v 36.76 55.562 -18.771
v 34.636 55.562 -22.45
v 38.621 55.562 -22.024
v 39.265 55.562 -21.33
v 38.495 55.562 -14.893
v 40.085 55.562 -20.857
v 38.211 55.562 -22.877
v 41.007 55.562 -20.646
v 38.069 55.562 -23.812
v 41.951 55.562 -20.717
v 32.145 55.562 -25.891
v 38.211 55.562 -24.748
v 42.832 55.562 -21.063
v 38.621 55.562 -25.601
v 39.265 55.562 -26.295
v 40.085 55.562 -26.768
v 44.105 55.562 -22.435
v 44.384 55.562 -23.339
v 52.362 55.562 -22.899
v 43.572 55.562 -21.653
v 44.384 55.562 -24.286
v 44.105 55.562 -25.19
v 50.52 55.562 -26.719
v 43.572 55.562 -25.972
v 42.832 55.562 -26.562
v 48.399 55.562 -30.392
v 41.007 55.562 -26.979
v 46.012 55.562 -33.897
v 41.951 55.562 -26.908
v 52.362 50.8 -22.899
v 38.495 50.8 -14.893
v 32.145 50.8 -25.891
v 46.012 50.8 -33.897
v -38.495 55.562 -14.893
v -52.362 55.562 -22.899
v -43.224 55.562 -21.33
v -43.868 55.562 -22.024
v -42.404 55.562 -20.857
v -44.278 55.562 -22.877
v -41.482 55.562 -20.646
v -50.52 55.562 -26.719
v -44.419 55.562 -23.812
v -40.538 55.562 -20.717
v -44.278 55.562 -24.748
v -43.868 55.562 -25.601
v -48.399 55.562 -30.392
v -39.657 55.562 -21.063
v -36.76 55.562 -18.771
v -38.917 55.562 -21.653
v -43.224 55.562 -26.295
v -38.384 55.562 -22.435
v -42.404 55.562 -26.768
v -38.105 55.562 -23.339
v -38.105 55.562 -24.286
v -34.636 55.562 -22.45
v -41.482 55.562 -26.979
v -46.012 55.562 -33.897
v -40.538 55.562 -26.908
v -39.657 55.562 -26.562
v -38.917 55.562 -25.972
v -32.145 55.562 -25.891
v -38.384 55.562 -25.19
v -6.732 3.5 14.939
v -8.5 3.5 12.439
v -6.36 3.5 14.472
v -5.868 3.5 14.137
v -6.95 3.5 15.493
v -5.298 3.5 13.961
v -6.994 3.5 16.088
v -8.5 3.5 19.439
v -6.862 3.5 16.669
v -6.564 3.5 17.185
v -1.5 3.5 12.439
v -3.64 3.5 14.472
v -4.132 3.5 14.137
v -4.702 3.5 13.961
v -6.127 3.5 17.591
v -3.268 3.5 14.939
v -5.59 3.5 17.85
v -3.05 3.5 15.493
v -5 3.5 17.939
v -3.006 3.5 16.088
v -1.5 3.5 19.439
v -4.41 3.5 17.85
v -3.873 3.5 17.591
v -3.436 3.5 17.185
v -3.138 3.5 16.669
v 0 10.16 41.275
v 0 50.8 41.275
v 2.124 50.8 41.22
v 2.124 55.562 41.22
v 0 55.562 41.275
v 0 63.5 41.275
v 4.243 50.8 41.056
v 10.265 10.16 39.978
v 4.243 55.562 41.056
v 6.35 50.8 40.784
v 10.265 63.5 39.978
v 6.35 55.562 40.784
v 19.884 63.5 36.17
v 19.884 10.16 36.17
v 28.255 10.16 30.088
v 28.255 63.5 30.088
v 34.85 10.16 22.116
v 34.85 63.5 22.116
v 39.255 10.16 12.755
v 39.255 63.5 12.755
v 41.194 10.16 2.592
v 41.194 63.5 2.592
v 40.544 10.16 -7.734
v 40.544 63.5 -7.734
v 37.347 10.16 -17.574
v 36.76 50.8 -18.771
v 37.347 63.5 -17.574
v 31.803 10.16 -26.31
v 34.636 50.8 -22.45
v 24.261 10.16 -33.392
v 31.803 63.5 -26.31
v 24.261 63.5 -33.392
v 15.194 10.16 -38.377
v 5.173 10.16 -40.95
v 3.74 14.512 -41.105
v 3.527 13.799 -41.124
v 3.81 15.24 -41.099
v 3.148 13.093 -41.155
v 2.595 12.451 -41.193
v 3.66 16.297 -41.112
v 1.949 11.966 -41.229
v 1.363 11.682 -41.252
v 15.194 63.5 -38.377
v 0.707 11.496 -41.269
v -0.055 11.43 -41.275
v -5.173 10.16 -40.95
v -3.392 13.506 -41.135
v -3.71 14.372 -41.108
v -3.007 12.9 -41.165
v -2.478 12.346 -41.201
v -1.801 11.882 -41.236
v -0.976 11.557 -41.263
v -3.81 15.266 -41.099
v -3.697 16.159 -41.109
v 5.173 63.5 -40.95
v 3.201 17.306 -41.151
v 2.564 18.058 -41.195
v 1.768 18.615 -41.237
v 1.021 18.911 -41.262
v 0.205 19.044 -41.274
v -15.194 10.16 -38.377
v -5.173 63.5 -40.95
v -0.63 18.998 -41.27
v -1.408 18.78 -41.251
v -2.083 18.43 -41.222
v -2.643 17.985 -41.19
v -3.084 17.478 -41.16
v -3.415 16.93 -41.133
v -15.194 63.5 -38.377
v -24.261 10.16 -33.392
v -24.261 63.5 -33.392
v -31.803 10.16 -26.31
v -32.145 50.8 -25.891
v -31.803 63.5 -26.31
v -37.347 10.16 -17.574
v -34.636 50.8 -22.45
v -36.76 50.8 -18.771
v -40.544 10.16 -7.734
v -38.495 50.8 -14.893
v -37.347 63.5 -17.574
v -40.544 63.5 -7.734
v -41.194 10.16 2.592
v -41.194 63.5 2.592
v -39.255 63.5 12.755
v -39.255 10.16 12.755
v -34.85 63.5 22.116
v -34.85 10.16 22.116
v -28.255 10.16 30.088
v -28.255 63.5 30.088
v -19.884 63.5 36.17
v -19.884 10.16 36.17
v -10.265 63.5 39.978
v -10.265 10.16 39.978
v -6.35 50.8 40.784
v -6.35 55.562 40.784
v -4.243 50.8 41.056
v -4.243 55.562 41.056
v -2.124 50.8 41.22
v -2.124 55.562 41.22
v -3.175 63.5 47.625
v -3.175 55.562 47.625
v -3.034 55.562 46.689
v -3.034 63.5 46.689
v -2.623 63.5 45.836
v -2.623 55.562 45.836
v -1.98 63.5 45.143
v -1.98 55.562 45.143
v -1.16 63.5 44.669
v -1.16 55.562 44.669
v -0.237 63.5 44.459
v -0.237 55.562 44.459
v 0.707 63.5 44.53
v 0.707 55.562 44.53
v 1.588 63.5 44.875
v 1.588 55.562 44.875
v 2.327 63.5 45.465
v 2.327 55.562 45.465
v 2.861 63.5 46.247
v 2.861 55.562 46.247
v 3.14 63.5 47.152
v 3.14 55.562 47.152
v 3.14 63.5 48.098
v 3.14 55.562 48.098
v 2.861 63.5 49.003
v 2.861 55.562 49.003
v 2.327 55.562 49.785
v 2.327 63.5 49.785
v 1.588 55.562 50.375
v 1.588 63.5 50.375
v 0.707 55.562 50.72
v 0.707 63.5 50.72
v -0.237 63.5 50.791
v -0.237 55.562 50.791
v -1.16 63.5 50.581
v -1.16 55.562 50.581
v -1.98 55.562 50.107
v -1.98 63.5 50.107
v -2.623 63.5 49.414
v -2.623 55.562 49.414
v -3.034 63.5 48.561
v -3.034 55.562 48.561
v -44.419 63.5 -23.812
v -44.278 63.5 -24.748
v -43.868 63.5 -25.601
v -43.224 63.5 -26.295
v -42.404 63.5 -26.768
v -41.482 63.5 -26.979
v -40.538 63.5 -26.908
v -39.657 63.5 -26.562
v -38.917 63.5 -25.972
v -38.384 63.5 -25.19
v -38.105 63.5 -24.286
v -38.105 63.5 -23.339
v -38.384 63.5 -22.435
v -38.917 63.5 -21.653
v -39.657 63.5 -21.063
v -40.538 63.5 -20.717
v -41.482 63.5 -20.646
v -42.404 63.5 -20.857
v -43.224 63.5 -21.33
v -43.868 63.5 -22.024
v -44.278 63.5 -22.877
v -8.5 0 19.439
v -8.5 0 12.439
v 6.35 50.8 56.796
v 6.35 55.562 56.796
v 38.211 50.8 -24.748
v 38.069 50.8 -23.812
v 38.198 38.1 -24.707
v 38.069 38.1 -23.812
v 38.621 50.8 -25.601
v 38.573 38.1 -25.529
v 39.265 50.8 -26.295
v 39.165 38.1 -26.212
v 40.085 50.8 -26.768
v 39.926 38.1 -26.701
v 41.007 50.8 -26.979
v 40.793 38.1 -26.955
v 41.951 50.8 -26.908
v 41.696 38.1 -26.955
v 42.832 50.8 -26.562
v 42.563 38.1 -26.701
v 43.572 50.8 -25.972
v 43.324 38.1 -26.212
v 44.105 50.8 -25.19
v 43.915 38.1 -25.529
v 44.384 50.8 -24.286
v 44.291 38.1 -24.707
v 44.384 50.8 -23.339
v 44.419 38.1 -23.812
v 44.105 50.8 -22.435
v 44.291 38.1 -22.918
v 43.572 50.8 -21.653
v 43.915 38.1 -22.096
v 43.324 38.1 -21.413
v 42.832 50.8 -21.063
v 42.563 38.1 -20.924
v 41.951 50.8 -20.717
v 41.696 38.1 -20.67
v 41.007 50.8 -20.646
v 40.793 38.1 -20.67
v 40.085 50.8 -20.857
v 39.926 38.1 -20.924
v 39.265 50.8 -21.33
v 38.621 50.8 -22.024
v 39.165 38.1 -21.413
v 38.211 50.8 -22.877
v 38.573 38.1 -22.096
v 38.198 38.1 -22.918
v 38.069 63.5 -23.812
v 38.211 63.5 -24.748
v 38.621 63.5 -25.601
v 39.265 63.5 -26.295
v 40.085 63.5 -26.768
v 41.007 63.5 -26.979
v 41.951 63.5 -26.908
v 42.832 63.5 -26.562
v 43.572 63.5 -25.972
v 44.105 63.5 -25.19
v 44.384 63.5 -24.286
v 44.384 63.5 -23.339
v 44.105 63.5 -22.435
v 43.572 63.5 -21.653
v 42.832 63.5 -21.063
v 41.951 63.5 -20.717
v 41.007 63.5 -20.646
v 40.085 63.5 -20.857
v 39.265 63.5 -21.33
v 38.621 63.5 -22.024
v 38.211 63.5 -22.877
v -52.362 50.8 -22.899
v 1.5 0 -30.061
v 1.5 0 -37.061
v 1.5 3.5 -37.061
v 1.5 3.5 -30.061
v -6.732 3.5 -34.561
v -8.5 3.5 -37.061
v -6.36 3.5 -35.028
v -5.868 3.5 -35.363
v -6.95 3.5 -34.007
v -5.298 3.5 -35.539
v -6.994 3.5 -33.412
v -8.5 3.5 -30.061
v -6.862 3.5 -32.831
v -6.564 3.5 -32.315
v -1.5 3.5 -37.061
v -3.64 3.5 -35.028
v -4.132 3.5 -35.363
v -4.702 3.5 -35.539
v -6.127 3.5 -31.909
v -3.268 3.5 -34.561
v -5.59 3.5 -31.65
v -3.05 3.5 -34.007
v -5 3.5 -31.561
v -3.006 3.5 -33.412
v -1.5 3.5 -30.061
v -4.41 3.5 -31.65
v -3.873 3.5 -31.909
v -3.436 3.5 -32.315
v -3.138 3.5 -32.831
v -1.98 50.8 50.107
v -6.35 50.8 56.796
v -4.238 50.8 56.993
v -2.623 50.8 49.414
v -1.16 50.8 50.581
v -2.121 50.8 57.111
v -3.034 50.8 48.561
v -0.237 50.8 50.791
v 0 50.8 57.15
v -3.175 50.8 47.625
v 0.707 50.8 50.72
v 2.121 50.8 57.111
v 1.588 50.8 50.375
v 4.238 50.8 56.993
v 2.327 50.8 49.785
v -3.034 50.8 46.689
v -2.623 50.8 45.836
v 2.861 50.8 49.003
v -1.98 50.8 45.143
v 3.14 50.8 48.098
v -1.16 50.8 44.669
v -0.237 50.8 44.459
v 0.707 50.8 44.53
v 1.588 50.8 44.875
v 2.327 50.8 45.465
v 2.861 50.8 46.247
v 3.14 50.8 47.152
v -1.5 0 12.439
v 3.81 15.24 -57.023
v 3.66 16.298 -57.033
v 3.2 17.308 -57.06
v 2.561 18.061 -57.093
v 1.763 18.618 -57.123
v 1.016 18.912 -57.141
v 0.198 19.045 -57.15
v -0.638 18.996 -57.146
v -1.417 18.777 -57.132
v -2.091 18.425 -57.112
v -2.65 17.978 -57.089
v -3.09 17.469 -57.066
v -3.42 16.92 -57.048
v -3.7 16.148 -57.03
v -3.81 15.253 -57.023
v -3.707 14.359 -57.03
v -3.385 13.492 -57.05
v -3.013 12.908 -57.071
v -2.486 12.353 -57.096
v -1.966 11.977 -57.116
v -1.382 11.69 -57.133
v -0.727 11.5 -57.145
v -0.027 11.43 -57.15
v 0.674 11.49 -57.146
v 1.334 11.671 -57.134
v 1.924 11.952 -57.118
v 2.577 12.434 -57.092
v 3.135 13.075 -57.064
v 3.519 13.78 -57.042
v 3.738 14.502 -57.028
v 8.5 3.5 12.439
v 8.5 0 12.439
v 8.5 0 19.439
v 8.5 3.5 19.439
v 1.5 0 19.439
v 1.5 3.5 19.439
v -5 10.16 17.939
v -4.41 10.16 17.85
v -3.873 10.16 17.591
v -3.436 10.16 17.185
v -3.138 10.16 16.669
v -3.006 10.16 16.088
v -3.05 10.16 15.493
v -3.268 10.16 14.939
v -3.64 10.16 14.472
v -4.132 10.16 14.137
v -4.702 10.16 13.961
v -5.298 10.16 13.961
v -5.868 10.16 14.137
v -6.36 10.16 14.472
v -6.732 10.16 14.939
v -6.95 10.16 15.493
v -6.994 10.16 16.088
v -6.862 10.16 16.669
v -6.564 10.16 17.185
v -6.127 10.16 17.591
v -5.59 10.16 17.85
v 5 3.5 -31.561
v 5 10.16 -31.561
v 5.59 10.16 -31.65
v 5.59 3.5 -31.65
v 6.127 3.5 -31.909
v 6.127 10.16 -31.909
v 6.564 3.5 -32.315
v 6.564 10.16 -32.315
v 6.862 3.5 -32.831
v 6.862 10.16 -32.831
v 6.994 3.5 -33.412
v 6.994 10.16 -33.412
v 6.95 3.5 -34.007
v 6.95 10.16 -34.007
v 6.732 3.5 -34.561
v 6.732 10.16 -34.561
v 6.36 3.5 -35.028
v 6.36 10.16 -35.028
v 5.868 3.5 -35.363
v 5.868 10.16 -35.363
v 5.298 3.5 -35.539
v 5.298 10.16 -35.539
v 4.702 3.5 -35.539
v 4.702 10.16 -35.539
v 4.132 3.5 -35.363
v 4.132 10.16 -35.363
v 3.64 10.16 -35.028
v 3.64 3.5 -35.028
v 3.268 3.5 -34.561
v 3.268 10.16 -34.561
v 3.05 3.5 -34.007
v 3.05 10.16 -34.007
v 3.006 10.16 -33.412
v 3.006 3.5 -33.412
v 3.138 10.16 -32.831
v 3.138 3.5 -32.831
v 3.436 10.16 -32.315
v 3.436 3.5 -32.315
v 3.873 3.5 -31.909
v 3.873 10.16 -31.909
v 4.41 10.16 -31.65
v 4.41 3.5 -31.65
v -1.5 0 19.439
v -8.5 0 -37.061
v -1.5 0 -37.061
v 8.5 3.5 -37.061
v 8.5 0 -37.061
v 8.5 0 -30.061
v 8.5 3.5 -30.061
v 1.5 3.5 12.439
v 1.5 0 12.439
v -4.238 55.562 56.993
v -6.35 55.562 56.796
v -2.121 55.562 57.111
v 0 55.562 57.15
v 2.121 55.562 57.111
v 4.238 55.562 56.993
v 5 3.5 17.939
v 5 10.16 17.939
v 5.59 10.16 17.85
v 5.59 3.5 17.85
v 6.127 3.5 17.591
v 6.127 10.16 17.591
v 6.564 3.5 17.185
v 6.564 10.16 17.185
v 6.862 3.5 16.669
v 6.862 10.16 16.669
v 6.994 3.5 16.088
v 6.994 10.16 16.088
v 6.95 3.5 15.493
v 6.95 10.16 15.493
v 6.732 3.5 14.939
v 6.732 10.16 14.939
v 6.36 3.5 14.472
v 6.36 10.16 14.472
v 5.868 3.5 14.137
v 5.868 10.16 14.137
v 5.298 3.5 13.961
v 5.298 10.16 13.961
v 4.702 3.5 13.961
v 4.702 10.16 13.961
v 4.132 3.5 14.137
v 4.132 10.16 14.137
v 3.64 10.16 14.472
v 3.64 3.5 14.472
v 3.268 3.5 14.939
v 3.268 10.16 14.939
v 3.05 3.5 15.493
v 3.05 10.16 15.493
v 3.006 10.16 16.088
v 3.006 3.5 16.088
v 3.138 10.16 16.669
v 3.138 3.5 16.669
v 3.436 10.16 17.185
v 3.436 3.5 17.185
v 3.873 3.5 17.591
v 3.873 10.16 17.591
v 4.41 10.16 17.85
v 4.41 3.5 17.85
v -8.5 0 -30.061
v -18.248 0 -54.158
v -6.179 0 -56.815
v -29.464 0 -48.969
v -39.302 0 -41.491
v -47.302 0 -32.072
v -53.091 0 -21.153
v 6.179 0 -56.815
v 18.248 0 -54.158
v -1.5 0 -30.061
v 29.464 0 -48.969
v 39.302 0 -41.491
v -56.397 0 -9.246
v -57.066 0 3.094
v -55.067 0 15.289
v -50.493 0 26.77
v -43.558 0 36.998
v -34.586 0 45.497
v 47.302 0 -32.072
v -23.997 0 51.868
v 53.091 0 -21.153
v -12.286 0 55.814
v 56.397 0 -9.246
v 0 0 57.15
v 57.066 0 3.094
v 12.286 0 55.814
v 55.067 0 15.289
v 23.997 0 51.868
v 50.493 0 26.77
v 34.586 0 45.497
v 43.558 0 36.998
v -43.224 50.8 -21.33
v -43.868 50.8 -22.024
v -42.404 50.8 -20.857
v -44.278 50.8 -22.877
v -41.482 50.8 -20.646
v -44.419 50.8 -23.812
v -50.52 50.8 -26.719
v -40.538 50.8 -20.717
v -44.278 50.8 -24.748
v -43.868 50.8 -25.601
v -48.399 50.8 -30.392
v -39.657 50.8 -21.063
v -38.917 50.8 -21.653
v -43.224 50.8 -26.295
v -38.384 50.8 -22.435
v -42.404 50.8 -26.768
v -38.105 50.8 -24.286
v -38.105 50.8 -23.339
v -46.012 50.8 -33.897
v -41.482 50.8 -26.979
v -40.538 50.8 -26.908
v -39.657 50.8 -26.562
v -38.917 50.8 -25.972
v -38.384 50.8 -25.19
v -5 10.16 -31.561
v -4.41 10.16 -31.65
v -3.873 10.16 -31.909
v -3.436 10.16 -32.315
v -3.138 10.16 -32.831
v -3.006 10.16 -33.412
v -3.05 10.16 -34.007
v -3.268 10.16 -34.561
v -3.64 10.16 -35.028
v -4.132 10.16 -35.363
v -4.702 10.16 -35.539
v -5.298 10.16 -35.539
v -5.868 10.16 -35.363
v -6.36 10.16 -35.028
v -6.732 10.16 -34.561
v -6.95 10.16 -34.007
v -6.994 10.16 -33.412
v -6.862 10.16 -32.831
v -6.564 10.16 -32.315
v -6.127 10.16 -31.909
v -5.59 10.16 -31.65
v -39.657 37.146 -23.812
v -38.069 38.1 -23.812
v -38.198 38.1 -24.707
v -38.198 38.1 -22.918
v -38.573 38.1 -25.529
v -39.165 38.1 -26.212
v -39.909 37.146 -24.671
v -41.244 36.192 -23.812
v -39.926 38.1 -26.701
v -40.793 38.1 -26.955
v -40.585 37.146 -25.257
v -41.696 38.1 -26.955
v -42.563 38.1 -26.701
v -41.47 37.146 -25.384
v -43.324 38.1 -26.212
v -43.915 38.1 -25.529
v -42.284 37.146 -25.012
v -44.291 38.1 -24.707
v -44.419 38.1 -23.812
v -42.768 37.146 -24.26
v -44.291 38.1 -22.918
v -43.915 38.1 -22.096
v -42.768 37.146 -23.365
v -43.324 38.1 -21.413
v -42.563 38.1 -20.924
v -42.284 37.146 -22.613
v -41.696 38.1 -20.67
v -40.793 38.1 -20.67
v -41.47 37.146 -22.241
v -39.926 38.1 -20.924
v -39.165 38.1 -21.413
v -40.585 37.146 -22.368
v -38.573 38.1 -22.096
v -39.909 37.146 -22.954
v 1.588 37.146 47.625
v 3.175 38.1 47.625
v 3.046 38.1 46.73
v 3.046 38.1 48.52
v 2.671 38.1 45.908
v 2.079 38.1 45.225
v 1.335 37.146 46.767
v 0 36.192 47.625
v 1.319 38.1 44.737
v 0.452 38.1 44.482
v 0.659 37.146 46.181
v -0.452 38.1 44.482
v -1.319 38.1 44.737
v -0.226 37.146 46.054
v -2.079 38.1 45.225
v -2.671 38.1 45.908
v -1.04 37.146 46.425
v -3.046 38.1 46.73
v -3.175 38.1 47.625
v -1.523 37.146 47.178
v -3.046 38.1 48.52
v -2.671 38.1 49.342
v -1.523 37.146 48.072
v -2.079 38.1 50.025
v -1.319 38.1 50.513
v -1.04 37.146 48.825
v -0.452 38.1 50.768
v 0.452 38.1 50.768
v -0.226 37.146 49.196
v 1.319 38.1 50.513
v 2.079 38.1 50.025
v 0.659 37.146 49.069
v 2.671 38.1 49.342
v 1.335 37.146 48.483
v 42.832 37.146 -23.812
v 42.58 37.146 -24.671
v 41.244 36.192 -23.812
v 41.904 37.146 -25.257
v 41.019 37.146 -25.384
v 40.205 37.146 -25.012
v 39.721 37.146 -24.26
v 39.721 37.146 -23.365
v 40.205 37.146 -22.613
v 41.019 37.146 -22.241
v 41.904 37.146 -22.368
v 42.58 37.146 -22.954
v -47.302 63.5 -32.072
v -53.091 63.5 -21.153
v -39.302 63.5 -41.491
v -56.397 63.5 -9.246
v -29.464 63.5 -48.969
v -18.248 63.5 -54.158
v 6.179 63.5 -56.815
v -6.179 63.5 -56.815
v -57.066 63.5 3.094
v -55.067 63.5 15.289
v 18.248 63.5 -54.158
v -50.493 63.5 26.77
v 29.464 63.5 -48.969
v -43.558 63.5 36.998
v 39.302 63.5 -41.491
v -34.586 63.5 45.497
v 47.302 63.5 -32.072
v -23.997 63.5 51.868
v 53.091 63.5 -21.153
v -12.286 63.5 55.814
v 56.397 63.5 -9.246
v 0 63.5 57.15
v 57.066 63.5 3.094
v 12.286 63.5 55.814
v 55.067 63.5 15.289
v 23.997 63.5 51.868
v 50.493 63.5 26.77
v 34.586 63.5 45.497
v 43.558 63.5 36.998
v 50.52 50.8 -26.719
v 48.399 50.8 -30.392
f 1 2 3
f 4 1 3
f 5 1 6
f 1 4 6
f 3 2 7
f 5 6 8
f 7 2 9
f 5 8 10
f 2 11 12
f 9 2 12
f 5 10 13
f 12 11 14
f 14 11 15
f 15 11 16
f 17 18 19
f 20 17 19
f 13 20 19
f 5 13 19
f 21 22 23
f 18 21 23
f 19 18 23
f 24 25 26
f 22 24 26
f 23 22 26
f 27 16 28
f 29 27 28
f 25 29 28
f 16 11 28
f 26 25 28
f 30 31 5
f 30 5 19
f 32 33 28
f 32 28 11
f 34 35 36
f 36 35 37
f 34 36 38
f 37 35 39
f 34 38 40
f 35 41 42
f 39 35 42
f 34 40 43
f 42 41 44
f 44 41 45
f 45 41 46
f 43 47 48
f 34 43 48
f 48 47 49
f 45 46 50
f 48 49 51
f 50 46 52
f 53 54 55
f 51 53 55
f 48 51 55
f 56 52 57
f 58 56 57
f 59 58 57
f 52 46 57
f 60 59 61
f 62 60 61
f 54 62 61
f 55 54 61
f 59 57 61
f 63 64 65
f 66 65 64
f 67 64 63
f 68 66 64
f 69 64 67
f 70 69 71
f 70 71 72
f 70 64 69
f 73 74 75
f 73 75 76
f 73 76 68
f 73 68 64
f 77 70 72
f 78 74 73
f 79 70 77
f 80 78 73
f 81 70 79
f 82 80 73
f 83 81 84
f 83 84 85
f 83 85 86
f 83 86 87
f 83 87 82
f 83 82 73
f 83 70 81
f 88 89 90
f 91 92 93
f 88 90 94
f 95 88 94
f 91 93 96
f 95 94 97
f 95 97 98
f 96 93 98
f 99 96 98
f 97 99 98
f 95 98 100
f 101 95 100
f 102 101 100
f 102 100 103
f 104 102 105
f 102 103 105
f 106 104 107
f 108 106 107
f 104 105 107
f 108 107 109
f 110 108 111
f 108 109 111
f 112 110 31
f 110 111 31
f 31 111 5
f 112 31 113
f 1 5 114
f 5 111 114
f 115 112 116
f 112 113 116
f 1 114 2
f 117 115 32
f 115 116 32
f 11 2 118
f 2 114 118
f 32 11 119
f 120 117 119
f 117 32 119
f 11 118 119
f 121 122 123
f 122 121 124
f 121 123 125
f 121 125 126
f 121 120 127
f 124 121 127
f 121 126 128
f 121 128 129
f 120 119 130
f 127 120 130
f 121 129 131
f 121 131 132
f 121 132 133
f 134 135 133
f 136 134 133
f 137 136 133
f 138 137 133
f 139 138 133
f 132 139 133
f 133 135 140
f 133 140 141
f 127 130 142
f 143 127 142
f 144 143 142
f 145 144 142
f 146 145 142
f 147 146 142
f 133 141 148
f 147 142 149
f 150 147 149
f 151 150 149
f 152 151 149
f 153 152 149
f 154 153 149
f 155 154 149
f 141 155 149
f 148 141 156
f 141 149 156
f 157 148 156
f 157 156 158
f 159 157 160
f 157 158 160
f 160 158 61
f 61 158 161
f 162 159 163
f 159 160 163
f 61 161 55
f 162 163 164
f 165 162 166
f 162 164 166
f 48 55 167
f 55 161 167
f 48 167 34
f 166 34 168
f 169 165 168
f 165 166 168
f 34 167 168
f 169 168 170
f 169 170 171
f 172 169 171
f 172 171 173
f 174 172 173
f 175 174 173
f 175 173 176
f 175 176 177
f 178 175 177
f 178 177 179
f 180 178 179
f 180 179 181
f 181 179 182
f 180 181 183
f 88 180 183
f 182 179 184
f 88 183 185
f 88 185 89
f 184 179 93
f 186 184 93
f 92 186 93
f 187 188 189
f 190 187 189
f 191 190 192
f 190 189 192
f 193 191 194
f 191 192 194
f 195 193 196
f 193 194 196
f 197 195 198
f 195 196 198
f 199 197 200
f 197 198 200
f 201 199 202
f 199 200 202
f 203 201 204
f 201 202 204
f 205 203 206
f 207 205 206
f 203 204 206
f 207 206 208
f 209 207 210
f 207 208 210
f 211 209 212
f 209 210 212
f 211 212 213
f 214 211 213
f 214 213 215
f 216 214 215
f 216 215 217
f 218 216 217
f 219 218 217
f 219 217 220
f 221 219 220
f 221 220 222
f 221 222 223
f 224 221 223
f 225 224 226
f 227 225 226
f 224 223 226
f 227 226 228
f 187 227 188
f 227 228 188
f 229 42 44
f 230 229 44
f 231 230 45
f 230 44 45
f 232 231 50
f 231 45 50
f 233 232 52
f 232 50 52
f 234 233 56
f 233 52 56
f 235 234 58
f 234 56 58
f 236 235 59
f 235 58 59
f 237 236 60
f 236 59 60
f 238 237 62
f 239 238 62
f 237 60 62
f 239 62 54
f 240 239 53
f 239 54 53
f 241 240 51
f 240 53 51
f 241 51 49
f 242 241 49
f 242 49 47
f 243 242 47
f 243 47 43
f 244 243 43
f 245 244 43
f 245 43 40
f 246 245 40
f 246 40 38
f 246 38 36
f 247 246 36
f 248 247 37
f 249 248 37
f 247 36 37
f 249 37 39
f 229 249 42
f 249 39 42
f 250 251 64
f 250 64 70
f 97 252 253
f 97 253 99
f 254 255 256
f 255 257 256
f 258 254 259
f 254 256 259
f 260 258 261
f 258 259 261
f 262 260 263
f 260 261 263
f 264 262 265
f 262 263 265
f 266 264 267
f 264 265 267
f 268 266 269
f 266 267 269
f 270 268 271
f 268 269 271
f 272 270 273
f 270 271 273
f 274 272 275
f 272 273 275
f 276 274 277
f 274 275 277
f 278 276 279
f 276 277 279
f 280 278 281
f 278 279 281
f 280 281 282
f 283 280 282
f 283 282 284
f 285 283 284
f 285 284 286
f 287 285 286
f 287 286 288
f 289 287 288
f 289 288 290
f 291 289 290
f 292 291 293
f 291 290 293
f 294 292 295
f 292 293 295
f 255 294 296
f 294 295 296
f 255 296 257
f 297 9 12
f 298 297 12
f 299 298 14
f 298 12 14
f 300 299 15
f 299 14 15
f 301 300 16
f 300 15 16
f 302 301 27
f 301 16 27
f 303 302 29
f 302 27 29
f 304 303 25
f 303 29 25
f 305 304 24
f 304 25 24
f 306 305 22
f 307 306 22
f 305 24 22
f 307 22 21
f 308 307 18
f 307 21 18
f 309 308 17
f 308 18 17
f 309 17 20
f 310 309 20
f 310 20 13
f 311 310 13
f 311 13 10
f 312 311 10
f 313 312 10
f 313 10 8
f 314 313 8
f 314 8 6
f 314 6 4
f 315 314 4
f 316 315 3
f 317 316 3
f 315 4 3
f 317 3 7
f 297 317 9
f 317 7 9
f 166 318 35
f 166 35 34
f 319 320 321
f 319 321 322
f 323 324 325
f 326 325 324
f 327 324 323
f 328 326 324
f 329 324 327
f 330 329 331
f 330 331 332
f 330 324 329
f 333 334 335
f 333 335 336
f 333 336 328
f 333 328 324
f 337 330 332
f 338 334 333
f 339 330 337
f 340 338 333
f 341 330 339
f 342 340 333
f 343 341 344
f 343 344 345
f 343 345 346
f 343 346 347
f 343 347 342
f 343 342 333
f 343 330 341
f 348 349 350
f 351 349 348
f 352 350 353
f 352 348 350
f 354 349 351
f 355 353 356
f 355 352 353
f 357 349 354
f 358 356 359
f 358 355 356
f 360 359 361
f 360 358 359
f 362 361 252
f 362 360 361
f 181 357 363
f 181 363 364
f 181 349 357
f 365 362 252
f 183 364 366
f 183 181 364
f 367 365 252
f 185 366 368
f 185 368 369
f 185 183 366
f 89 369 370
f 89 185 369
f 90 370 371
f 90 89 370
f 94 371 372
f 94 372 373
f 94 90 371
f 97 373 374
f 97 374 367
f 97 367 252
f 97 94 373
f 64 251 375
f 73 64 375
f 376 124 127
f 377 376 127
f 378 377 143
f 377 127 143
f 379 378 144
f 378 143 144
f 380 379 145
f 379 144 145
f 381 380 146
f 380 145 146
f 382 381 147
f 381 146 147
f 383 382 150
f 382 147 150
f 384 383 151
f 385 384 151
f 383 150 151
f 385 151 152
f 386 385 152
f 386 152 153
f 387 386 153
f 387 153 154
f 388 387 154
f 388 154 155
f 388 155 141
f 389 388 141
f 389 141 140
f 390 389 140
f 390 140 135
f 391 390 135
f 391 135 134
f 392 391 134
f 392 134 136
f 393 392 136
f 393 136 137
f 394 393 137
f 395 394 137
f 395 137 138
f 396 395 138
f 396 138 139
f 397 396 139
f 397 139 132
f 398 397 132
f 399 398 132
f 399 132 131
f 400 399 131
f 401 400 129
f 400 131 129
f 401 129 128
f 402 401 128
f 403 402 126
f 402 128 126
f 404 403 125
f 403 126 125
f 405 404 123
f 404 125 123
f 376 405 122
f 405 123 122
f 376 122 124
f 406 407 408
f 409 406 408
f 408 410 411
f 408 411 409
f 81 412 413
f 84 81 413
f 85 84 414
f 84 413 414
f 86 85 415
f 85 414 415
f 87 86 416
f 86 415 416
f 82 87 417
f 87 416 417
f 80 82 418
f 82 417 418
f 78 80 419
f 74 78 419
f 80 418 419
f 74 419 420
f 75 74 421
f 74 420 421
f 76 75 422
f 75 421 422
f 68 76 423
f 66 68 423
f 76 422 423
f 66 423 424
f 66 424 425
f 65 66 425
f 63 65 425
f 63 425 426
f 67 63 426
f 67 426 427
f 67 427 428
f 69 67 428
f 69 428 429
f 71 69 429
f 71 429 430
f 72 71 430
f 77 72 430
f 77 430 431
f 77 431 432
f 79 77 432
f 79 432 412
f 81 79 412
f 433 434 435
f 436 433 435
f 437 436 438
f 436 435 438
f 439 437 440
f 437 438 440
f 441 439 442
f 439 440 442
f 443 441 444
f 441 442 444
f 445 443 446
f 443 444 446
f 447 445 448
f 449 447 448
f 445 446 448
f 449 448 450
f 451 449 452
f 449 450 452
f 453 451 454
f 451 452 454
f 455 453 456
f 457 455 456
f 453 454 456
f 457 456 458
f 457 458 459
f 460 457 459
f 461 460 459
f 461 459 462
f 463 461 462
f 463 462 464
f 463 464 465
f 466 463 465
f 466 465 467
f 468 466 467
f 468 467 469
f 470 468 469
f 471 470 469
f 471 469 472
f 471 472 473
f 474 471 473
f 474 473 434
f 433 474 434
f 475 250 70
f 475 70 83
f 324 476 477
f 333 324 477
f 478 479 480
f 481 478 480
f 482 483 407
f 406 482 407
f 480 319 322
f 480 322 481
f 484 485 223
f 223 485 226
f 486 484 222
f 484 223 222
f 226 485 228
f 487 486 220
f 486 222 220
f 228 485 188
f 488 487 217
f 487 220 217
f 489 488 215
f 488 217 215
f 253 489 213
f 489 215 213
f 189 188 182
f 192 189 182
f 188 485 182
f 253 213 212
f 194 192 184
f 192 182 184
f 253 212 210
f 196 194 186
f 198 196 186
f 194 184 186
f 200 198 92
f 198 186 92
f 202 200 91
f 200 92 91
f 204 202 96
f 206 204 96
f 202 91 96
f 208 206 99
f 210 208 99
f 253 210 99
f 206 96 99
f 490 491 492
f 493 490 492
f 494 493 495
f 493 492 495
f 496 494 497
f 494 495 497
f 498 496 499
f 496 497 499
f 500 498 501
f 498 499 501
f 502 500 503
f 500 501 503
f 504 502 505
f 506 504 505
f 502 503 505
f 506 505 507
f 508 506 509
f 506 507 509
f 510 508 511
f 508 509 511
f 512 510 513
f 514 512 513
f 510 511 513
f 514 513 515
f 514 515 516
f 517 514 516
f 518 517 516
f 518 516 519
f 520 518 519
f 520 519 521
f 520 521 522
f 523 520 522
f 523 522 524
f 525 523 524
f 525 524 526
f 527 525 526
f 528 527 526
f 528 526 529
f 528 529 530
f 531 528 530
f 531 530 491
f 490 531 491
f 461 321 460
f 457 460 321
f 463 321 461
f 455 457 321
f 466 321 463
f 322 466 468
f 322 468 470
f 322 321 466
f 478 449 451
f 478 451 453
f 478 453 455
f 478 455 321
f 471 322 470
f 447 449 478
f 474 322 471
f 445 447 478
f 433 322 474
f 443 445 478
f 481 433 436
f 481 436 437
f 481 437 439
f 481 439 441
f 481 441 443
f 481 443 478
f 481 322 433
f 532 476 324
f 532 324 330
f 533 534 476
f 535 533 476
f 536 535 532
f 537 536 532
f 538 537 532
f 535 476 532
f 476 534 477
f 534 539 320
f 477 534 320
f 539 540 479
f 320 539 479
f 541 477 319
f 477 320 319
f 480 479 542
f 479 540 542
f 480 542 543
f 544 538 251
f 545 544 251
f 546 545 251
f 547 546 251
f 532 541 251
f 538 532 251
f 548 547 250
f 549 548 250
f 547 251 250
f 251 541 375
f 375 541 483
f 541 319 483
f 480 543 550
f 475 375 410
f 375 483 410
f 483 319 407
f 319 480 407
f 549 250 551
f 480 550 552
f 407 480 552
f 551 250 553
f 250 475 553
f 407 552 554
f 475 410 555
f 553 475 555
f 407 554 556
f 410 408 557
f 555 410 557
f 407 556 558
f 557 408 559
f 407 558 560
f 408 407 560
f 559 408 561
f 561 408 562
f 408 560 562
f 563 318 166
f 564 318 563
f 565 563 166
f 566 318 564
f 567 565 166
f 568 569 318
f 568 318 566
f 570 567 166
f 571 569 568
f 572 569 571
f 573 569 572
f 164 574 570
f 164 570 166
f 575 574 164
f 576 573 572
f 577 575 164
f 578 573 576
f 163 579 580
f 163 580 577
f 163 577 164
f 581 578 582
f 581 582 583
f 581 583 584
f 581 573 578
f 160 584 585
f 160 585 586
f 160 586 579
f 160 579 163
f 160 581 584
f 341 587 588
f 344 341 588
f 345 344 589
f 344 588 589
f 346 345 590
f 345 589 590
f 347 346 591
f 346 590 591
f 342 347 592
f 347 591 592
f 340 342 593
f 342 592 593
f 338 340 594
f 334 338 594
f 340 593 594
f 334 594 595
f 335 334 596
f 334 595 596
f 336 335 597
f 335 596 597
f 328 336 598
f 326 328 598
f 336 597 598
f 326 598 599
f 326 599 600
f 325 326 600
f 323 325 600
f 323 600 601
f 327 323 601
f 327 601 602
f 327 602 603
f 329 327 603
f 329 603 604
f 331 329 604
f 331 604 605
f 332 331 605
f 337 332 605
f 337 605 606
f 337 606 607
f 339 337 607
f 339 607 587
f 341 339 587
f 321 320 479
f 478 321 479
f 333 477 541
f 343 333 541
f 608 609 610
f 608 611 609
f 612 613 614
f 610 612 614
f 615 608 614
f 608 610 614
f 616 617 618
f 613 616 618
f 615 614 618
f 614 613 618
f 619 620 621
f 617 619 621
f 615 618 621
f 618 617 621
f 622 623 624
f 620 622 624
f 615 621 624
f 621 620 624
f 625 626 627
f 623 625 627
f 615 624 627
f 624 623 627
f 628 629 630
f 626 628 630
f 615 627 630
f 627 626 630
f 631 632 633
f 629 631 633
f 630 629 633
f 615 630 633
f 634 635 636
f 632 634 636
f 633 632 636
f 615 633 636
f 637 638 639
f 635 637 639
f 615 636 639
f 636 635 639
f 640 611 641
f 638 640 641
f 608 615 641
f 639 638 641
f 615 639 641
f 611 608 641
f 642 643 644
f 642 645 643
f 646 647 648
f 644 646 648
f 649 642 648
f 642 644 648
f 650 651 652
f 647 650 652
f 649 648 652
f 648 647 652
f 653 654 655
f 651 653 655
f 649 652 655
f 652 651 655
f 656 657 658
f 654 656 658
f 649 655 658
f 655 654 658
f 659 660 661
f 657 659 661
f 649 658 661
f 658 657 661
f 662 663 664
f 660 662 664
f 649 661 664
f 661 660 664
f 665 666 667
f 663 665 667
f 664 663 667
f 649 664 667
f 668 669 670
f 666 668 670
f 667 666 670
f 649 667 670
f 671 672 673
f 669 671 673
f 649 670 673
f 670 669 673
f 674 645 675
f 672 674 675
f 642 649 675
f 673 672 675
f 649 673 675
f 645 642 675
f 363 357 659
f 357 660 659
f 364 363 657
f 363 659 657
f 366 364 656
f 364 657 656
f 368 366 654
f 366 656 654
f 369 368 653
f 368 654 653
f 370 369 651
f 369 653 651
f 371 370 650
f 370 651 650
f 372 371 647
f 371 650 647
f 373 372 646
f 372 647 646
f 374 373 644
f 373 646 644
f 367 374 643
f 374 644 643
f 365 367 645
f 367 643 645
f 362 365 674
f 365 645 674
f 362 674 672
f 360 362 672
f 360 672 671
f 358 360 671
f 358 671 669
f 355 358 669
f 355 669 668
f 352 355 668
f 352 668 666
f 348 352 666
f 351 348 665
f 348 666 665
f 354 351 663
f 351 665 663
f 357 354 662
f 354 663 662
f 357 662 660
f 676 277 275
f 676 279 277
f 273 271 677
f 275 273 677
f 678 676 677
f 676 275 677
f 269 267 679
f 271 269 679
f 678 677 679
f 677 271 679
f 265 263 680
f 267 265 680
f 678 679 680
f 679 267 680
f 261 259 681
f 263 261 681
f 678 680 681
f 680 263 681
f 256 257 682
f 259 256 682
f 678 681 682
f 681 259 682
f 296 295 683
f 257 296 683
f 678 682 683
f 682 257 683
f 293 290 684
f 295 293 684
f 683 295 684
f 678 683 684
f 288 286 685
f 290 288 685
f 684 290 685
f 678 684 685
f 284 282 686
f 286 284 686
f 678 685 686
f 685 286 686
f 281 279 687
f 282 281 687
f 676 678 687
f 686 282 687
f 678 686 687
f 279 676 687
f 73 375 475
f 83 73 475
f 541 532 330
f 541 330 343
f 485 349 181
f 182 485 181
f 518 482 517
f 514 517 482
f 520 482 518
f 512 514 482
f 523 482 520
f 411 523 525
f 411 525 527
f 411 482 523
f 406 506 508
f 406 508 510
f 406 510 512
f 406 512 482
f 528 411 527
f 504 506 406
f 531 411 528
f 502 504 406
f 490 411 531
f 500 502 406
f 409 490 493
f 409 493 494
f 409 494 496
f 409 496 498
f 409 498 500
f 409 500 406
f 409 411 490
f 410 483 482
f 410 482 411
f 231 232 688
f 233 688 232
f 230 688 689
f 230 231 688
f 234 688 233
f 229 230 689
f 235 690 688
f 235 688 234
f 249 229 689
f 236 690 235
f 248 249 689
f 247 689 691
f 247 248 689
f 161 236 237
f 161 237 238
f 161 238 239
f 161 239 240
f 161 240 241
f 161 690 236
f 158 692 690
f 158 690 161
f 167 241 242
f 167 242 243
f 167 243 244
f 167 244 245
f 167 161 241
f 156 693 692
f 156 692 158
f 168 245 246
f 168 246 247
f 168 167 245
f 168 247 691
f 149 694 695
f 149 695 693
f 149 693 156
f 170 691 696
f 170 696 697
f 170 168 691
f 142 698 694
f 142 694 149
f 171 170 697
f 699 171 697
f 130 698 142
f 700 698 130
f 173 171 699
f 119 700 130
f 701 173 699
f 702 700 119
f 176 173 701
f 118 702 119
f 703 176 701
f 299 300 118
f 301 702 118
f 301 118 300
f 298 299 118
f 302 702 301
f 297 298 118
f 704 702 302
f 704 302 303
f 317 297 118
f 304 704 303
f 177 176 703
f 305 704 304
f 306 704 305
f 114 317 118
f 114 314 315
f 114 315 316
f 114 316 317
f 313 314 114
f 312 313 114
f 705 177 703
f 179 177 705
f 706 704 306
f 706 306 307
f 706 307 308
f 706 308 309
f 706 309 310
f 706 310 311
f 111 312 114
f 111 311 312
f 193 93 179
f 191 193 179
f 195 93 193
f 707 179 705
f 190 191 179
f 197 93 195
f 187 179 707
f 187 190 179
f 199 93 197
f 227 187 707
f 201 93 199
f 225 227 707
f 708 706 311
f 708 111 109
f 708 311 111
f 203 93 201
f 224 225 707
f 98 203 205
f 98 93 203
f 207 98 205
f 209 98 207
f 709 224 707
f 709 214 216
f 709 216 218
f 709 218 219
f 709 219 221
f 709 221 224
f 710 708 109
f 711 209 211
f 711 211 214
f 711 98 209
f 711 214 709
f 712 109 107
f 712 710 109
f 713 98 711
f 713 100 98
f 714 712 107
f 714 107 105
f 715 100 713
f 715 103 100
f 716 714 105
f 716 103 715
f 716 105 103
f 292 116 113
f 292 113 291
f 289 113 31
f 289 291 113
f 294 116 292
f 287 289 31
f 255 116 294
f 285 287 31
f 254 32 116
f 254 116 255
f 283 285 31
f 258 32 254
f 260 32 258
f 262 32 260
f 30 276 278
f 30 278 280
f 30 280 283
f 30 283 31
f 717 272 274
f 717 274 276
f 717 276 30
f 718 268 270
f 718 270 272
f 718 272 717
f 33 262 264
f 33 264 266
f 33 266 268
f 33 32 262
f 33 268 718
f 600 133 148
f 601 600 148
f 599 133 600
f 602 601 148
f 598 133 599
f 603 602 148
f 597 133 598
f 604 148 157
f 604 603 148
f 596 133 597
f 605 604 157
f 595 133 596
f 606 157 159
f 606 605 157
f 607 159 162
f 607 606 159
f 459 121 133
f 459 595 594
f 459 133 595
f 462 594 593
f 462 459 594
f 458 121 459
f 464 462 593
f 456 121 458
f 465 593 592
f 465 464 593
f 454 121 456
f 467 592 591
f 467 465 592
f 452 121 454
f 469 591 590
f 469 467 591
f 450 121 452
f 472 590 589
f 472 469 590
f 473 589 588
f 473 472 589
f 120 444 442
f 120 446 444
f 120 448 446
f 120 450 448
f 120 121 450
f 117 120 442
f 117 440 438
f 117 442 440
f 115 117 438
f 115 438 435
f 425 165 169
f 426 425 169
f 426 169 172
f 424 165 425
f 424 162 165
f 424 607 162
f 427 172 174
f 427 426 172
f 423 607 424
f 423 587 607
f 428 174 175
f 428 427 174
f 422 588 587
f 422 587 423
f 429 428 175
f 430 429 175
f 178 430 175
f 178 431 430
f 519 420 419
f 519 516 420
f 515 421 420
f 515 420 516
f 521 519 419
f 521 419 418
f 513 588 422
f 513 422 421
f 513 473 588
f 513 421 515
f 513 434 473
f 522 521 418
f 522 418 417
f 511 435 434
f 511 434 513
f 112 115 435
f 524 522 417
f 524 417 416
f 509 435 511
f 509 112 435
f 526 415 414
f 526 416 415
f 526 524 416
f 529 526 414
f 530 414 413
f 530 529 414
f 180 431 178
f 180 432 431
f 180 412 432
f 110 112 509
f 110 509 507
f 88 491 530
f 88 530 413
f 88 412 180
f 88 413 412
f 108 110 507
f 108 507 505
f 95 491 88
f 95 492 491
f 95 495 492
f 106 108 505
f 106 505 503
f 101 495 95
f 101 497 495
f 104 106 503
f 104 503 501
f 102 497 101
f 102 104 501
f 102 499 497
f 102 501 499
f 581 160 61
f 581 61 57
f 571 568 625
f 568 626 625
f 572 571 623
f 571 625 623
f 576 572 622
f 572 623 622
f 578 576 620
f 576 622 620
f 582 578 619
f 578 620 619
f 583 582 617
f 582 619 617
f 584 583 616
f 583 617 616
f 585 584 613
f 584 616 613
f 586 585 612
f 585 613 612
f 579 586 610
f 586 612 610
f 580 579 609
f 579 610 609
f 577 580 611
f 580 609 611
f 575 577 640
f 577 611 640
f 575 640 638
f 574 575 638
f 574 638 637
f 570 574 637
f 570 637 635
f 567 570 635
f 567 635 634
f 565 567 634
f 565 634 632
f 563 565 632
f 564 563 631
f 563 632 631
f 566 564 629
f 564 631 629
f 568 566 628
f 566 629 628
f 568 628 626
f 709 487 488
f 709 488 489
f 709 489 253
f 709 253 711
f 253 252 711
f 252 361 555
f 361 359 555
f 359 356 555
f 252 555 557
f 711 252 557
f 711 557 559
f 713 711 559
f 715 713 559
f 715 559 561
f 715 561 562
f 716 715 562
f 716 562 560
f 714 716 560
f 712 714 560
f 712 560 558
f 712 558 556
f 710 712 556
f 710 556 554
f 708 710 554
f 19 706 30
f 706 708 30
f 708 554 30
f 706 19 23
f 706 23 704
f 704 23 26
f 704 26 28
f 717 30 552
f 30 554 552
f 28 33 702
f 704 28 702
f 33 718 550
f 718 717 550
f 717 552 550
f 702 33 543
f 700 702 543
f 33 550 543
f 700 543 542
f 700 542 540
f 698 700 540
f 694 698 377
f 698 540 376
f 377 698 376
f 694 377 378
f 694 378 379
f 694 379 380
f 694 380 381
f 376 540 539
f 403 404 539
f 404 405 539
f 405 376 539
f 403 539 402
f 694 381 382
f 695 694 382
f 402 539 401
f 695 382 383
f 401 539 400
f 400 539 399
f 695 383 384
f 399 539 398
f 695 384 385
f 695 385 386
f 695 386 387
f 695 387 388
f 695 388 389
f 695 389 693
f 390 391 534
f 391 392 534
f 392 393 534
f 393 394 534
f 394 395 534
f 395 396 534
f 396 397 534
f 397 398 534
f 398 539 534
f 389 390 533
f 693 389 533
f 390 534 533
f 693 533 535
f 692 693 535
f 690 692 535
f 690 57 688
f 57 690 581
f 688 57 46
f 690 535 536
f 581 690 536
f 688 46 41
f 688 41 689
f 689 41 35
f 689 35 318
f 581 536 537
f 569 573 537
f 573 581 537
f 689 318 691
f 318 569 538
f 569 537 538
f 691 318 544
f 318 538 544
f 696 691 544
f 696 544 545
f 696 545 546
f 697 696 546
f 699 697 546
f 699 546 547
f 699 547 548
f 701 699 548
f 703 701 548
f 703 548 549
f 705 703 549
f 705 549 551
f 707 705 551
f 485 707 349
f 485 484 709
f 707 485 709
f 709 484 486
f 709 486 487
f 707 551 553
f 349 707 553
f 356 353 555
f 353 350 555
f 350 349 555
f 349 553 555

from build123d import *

# Parameters (mm, degrees)
SKETCH1_R                       = 57.15
BOSS_EXTRUDE1_DEPTH             = 63.5
SKETCH2_R                       = 41.275
CUT_EXTRUDE1_DEPTH              = 53.34
F_1_4_0_25_DIAMETER_HOLE4_D     = 6.35
F_1_4_0_25_DIAMETER_HOLE4_DEPTH = 25.4
F_1_4_0_25_DIAMETER_HOLE4_TIP   = 1.907732465
SKETCH7_R                       = 3.81
CUT_EXTRUDE2_DEPTH              = 103.783729257
F_4_0MM_DOWEL_HOLE1_D           = 4
SKETCH9_W                       = 7
SKETCH9_H                       = 7
CUT_EXTRUDE3_DEPTH              = 3.5
SKETCH12_W                      = 12.7
SKETCH12_H                      = 19.05
CUT_EXTRUDE4_DEPTH              = 4.7625


with BuildPart() as part:
    # Sketch1 → Boss-Extrude1 (new body)
    with BuildSketch(Plane(origin=(0, 0, 0), x_dir=(1, 0, 0), z_dir=(0, 1, 0))):
        with Locations(Location((0, 0, 0), (0, 0, 270))):
            Circle(SKETCH1_R)
    extrude(amount=BOSS_EXTRUDE1_DEPTH)

    # Sketch2 → Cut-Extrude1 (cut)
    with BuildSketch(Plane(origin=(0, 63.5, 0), x_dir=(1, 0, 0), z_dir=(0, 1, 0))):
        with Locations(Location((0, 0, 0), (0, 0, 270))):
            Circle(SKETCH2_R)
    extrude(amount=-CUT_EXTRUDE1_DEPTH, mode=Mode.SUBTRACT)

    # 1/4 (0.25) Diameter Hole4
    with Locations(Plane(origin=(0, 63.5, 0), x_dir=(1, 0, 0), z_dir=(0, 1, 0))):
        with Locations((-41.244459855, 23.8125), (0, -47.625), (41.244459855, 23.8125)):
            Hole(F_1_4_0_25_DIAMETER_HOLE4_D / 2, depth=F_1_4_0_25_DIAMETER_HOLE4_DEPTH)
            with Locations((0, 0, -(F_1_4_0_25_DIAMETER_HOLE4_DEPTH + F_1_4_0_25_DIAMETER_HOLE4_TIP / 2))):  # 118° drill point
                Cone(0, F_1_4_0_25_DIAMETER_HOLE4_D / 2, F_1_4_0_25_DIAMETER_HOLE4_TIP, mode=Mode.SUBTRACT)

    # Sketch7 → Cut-Extrude2 (cut, through all)
    with BuildSketch(Plane.XY):
        with Locations((0, 15.24)):
            Circle(SKETCH7_R)
    extrude(amount=-CUT_EXTRUDE2_DEPTH, mode=Mode.SUBTRACT)

    # Ø4.0mm Dowel Hole1 (through all)
    with Locations(Plane(origin=(-5, 0, 15.938504039), x_dir=(0, 0, -1), z_dir=(0, -1, 0))):
        with Locations((0, 0), (0, 10), (49.5, 10), (49.5, 0)):
            Hole(F_4_0MM_DOWEL_HOLE1_D / 2)

    # Sketch9 → Cut-Extrude3 (cut)
    with BuildSketch(Plane.XZ):
        with Locations((-5, 15.938504039)):
            Rectangle(SKETCH9_W, SKETCH9_H)
        with Locations((5, 15.938504039)):
            Rectangle(SKETCH9_W, SKETCH9_H)
        with Locations((5, -33.561495961)):
            Rectangle(SKETCH9_W, SKETCH9_H)
        with Locations((-5, -33.561495961)):
            Rectangle(SKETCH9_W, SKETCH9_H)
    extrude(amount=-CUT_EXTRUDE3_DEPTH, mode=Mode.SUBTRACT)

    # Sketch12 → Cut-Extrude4 (cut)
    with BuildSketch(Plane(origin=(0, 50.8, 0), x_dir=(1, 0, 0), z_dir=(0, 1, 0))):
        Polygon((-54.992429237, 24.417545405), (-38.494645295, 14.892545405), (-35.319645295, 20.391806719), (-51.817429237, 29.916806719), align=None)
        Polygon((-51.817429237, 29.916806719), (-35.319645295, 20.391806719), (-32.144645295, 25.891068033), (-48.642429237, 35.416068033), align=None)
        Polygon((32.144645295, 25.891068033), (35.319645295, 20.391806719), (51.817429237, 29.916806719), (48.642429237, 35.416068033), align=None)
        Polygon((51.817429237, 29.916806719), (35.319645295, 20.391806719), (38.494645295, 14.892545405), (54.992429237, 24.417545405), align=None)
        with Locations((0, -50.308613437)):
            Rectangle(SKETCH12_W, SKETCH12_H)
    extrude(amount=CUT_EXTRUDE4_DEPTH, mode=Mode.SUBTRACT)


solid = part.part
